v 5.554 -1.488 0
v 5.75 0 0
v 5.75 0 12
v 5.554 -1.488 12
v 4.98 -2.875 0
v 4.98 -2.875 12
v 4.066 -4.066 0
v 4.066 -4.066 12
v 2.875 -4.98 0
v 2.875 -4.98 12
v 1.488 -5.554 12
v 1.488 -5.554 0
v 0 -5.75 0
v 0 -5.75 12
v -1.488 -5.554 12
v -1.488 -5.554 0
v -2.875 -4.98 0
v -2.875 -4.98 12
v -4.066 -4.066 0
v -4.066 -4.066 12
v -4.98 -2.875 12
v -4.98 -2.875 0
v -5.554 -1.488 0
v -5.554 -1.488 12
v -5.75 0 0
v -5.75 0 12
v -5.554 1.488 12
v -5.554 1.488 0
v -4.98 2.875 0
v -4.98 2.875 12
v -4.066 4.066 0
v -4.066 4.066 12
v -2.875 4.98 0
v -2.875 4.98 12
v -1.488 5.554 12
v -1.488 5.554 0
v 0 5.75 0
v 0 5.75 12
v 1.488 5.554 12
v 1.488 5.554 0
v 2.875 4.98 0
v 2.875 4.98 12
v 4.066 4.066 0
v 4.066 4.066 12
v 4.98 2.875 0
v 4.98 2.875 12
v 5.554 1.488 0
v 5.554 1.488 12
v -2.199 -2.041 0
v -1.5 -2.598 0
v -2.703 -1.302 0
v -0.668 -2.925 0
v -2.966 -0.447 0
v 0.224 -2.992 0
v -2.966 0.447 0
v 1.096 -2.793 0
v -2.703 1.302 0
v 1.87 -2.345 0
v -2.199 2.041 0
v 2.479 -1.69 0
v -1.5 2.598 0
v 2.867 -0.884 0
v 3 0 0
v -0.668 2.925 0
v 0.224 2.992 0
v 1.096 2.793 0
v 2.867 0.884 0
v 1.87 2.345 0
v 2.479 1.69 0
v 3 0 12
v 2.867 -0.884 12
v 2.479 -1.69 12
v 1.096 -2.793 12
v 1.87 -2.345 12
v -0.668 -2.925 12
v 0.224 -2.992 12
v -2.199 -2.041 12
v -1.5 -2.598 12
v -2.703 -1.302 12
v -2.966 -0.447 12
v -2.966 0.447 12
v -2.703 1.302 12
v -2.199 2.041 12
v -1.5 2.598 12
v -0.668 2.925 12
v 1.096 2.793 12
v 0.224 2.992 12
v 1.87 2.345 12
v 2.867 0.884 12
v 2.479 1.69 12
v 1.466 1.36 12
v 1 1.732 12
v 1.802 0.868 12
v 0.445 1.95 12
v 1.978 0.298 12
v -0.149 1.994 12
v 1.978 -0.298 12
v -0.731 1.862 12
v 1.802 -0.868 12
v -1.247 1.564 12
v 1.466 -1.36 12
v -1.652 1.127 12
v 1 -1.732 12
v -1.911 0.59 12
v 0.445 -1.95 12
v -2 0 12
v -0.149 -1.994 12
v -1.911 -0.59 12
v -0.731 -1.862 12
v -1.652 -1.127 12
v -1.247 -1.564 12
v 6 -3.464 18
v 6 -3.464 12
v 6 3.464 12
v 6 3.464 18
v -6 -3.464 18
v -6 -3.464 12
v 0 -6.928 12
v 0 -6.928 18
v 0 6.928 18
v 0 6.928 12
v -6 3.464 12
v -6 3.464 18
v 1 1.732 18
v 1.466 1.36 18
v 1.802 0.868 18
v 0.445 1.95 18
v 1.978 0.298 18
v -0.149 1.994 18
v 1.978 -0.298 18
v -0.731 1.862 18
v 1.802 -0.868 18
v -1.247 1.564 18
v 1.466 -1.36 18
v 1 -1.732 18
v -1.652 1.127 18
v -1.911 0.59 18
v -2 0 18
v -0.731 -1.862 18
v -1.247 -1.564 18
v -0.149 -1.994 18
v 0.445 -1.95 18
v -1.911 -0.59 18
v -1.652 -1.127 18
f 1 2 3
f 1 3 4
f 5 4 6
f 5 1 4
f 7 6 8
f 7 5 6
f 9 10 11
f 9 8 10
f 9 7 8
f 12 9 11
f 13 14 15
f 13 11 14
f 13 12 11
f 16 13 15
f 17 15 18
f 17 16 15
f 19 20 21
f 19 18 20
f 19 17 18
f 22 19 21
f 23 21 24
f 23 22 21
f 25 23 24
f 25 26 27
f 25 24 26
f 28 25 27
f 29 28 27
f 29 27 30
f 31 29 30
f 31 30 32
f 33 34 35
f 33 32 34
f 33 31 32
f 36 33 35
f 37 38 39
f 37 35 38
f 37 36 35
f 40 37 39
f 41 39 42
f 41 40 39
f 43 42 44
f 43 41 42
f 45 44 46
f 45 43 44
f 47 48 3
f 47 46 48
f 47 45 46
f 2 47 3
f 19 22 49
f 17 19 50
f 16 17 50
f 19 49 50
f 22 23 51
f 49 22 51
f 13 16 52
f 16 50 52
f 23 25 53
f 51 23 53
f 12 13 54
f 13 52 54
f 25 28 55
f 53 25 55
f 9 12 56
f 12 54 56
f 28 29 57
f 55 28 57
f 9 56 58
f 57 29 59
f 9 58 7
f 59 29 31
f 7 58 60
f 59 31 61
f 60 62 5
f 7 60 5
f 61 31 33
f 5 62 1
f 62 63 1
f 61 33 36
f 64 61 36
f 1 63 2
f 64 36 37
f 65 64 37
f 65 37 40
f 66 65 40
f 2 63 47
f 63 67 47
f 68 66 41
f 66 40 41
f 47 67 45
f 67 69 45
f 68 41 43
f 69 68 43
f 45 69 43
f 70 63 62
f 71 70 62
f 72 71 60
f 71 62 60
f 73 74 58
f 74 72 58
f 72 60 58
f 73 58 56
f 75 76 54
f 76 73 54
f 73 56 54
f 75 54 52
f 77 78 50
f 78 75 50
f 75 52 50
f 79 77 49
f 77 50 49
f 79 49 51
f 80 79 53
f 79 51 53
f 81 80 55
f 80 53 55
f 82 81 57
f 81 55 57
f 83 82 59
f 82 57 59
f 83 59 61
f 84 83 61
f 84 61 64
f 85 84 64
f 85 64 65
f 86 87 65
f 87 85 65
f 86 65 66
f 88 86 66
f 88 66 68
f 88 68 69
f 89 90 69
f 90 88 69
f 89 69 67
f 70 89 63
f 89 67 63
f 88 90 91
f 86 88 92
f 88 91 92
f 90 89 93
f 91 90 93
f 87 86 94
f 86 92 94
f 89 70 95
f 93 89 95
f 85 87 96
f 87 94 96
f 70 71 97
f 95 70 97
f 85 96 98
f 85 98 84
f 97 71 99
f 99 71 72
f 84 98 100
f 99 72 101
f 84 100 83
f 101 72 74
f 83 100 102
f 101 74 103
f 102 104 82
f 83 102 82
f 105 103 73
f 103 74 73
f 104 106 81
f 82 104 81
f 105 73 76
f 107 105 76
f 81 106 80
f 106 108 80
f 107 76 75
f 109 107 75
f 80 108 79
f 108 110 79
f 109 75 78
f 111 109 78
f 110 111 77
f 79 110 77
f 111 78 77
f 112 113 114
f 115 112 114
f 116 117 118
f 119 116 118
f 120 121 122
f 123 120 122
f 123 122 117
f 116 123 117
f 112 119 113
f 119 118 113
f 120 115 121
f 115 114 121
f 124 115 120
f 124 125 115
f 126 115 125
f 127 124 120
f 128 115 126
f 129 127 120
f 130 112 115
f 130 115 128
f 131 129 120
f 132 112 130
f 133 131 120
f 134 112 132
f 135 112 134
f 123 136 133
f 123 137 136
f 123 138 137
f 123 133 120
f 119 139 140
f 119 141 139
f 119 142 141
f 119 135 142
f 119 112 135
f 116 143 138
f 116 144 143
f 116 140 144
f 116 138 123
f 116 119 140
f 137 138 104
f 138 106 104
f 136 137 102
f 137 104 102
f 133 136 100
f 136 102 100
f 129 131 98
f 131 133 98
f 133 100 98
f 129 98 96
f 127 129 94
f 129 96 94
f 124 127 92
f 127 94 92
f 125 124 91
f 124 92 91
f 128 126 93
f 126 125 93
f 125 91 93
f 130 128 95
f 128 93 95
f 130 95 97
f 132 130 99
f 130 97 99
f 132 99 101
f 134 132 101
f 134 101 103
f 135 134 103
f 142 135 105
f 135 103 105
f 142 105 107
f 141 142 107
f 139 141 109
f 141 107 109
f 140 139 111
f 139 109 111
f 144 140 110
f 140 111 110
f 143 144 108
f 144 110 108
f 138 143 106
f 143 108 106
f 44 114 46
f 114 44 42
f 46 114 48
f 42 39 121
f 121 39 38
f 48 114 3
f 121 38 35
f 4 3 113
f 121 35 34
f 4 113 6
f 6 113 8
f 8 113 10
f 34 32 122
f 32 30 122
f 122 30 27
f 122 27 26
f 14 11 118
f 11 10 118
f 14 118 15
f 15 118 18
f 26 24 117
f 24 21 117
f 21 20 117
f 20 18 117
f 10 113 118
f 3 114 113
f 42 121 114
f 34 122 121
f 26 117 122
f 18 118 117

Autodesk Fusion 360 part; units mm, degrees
sketch "Sketch1" plane through (0, 0, 0) normal (0, 0, 1) x (1, 0, 0) in component "Component"
  circle A0 centre (0, 0) radius 5.75
  circle A1 centre (0, 0) radius 3
  dimension "d1" = 11.5
  dimension "d2" = 6
extrude "Extrude1" add sketch "Sketch1" along normal blind 12 in component "Component"
sketch "Sketch2" plane through (0, 0, 12) normal (0, 0, 1) x (-1, 0, 0) in component "Component"
  circle A0 centre (0, 0) radius 3
  circle A1 centre (0, 0) radius 5.75
  circle A2 centre (0, 0) radius 2
  line L0 (-6, 3.4641) -> (-6, -3.4641)
  line L1 (-6, -3.4641) -> (0, -6.9282)
  line L2 (0, -6.9282) -> (6, -3.4641)
  line L3 (6, -3.4641) -> (6, 3.4641)
  line L4 (6, 3.4641) -> (0, 6.9282)
  line L5 (0, 6.9282) -> (-6, 3.4641)
  dimension "d5" = 4
  dimension "d6" = 6
extrude "Extrude2" add sketch "Sketch2" along normal blind 6 contours A0 | A1 | L0 L1 L2 L3 L4 L5 in component "Component"
component "Component" placed x (1, 0, 0) y (0, 1, 0) z (0, 0, 1) at (0, 0, 0)
